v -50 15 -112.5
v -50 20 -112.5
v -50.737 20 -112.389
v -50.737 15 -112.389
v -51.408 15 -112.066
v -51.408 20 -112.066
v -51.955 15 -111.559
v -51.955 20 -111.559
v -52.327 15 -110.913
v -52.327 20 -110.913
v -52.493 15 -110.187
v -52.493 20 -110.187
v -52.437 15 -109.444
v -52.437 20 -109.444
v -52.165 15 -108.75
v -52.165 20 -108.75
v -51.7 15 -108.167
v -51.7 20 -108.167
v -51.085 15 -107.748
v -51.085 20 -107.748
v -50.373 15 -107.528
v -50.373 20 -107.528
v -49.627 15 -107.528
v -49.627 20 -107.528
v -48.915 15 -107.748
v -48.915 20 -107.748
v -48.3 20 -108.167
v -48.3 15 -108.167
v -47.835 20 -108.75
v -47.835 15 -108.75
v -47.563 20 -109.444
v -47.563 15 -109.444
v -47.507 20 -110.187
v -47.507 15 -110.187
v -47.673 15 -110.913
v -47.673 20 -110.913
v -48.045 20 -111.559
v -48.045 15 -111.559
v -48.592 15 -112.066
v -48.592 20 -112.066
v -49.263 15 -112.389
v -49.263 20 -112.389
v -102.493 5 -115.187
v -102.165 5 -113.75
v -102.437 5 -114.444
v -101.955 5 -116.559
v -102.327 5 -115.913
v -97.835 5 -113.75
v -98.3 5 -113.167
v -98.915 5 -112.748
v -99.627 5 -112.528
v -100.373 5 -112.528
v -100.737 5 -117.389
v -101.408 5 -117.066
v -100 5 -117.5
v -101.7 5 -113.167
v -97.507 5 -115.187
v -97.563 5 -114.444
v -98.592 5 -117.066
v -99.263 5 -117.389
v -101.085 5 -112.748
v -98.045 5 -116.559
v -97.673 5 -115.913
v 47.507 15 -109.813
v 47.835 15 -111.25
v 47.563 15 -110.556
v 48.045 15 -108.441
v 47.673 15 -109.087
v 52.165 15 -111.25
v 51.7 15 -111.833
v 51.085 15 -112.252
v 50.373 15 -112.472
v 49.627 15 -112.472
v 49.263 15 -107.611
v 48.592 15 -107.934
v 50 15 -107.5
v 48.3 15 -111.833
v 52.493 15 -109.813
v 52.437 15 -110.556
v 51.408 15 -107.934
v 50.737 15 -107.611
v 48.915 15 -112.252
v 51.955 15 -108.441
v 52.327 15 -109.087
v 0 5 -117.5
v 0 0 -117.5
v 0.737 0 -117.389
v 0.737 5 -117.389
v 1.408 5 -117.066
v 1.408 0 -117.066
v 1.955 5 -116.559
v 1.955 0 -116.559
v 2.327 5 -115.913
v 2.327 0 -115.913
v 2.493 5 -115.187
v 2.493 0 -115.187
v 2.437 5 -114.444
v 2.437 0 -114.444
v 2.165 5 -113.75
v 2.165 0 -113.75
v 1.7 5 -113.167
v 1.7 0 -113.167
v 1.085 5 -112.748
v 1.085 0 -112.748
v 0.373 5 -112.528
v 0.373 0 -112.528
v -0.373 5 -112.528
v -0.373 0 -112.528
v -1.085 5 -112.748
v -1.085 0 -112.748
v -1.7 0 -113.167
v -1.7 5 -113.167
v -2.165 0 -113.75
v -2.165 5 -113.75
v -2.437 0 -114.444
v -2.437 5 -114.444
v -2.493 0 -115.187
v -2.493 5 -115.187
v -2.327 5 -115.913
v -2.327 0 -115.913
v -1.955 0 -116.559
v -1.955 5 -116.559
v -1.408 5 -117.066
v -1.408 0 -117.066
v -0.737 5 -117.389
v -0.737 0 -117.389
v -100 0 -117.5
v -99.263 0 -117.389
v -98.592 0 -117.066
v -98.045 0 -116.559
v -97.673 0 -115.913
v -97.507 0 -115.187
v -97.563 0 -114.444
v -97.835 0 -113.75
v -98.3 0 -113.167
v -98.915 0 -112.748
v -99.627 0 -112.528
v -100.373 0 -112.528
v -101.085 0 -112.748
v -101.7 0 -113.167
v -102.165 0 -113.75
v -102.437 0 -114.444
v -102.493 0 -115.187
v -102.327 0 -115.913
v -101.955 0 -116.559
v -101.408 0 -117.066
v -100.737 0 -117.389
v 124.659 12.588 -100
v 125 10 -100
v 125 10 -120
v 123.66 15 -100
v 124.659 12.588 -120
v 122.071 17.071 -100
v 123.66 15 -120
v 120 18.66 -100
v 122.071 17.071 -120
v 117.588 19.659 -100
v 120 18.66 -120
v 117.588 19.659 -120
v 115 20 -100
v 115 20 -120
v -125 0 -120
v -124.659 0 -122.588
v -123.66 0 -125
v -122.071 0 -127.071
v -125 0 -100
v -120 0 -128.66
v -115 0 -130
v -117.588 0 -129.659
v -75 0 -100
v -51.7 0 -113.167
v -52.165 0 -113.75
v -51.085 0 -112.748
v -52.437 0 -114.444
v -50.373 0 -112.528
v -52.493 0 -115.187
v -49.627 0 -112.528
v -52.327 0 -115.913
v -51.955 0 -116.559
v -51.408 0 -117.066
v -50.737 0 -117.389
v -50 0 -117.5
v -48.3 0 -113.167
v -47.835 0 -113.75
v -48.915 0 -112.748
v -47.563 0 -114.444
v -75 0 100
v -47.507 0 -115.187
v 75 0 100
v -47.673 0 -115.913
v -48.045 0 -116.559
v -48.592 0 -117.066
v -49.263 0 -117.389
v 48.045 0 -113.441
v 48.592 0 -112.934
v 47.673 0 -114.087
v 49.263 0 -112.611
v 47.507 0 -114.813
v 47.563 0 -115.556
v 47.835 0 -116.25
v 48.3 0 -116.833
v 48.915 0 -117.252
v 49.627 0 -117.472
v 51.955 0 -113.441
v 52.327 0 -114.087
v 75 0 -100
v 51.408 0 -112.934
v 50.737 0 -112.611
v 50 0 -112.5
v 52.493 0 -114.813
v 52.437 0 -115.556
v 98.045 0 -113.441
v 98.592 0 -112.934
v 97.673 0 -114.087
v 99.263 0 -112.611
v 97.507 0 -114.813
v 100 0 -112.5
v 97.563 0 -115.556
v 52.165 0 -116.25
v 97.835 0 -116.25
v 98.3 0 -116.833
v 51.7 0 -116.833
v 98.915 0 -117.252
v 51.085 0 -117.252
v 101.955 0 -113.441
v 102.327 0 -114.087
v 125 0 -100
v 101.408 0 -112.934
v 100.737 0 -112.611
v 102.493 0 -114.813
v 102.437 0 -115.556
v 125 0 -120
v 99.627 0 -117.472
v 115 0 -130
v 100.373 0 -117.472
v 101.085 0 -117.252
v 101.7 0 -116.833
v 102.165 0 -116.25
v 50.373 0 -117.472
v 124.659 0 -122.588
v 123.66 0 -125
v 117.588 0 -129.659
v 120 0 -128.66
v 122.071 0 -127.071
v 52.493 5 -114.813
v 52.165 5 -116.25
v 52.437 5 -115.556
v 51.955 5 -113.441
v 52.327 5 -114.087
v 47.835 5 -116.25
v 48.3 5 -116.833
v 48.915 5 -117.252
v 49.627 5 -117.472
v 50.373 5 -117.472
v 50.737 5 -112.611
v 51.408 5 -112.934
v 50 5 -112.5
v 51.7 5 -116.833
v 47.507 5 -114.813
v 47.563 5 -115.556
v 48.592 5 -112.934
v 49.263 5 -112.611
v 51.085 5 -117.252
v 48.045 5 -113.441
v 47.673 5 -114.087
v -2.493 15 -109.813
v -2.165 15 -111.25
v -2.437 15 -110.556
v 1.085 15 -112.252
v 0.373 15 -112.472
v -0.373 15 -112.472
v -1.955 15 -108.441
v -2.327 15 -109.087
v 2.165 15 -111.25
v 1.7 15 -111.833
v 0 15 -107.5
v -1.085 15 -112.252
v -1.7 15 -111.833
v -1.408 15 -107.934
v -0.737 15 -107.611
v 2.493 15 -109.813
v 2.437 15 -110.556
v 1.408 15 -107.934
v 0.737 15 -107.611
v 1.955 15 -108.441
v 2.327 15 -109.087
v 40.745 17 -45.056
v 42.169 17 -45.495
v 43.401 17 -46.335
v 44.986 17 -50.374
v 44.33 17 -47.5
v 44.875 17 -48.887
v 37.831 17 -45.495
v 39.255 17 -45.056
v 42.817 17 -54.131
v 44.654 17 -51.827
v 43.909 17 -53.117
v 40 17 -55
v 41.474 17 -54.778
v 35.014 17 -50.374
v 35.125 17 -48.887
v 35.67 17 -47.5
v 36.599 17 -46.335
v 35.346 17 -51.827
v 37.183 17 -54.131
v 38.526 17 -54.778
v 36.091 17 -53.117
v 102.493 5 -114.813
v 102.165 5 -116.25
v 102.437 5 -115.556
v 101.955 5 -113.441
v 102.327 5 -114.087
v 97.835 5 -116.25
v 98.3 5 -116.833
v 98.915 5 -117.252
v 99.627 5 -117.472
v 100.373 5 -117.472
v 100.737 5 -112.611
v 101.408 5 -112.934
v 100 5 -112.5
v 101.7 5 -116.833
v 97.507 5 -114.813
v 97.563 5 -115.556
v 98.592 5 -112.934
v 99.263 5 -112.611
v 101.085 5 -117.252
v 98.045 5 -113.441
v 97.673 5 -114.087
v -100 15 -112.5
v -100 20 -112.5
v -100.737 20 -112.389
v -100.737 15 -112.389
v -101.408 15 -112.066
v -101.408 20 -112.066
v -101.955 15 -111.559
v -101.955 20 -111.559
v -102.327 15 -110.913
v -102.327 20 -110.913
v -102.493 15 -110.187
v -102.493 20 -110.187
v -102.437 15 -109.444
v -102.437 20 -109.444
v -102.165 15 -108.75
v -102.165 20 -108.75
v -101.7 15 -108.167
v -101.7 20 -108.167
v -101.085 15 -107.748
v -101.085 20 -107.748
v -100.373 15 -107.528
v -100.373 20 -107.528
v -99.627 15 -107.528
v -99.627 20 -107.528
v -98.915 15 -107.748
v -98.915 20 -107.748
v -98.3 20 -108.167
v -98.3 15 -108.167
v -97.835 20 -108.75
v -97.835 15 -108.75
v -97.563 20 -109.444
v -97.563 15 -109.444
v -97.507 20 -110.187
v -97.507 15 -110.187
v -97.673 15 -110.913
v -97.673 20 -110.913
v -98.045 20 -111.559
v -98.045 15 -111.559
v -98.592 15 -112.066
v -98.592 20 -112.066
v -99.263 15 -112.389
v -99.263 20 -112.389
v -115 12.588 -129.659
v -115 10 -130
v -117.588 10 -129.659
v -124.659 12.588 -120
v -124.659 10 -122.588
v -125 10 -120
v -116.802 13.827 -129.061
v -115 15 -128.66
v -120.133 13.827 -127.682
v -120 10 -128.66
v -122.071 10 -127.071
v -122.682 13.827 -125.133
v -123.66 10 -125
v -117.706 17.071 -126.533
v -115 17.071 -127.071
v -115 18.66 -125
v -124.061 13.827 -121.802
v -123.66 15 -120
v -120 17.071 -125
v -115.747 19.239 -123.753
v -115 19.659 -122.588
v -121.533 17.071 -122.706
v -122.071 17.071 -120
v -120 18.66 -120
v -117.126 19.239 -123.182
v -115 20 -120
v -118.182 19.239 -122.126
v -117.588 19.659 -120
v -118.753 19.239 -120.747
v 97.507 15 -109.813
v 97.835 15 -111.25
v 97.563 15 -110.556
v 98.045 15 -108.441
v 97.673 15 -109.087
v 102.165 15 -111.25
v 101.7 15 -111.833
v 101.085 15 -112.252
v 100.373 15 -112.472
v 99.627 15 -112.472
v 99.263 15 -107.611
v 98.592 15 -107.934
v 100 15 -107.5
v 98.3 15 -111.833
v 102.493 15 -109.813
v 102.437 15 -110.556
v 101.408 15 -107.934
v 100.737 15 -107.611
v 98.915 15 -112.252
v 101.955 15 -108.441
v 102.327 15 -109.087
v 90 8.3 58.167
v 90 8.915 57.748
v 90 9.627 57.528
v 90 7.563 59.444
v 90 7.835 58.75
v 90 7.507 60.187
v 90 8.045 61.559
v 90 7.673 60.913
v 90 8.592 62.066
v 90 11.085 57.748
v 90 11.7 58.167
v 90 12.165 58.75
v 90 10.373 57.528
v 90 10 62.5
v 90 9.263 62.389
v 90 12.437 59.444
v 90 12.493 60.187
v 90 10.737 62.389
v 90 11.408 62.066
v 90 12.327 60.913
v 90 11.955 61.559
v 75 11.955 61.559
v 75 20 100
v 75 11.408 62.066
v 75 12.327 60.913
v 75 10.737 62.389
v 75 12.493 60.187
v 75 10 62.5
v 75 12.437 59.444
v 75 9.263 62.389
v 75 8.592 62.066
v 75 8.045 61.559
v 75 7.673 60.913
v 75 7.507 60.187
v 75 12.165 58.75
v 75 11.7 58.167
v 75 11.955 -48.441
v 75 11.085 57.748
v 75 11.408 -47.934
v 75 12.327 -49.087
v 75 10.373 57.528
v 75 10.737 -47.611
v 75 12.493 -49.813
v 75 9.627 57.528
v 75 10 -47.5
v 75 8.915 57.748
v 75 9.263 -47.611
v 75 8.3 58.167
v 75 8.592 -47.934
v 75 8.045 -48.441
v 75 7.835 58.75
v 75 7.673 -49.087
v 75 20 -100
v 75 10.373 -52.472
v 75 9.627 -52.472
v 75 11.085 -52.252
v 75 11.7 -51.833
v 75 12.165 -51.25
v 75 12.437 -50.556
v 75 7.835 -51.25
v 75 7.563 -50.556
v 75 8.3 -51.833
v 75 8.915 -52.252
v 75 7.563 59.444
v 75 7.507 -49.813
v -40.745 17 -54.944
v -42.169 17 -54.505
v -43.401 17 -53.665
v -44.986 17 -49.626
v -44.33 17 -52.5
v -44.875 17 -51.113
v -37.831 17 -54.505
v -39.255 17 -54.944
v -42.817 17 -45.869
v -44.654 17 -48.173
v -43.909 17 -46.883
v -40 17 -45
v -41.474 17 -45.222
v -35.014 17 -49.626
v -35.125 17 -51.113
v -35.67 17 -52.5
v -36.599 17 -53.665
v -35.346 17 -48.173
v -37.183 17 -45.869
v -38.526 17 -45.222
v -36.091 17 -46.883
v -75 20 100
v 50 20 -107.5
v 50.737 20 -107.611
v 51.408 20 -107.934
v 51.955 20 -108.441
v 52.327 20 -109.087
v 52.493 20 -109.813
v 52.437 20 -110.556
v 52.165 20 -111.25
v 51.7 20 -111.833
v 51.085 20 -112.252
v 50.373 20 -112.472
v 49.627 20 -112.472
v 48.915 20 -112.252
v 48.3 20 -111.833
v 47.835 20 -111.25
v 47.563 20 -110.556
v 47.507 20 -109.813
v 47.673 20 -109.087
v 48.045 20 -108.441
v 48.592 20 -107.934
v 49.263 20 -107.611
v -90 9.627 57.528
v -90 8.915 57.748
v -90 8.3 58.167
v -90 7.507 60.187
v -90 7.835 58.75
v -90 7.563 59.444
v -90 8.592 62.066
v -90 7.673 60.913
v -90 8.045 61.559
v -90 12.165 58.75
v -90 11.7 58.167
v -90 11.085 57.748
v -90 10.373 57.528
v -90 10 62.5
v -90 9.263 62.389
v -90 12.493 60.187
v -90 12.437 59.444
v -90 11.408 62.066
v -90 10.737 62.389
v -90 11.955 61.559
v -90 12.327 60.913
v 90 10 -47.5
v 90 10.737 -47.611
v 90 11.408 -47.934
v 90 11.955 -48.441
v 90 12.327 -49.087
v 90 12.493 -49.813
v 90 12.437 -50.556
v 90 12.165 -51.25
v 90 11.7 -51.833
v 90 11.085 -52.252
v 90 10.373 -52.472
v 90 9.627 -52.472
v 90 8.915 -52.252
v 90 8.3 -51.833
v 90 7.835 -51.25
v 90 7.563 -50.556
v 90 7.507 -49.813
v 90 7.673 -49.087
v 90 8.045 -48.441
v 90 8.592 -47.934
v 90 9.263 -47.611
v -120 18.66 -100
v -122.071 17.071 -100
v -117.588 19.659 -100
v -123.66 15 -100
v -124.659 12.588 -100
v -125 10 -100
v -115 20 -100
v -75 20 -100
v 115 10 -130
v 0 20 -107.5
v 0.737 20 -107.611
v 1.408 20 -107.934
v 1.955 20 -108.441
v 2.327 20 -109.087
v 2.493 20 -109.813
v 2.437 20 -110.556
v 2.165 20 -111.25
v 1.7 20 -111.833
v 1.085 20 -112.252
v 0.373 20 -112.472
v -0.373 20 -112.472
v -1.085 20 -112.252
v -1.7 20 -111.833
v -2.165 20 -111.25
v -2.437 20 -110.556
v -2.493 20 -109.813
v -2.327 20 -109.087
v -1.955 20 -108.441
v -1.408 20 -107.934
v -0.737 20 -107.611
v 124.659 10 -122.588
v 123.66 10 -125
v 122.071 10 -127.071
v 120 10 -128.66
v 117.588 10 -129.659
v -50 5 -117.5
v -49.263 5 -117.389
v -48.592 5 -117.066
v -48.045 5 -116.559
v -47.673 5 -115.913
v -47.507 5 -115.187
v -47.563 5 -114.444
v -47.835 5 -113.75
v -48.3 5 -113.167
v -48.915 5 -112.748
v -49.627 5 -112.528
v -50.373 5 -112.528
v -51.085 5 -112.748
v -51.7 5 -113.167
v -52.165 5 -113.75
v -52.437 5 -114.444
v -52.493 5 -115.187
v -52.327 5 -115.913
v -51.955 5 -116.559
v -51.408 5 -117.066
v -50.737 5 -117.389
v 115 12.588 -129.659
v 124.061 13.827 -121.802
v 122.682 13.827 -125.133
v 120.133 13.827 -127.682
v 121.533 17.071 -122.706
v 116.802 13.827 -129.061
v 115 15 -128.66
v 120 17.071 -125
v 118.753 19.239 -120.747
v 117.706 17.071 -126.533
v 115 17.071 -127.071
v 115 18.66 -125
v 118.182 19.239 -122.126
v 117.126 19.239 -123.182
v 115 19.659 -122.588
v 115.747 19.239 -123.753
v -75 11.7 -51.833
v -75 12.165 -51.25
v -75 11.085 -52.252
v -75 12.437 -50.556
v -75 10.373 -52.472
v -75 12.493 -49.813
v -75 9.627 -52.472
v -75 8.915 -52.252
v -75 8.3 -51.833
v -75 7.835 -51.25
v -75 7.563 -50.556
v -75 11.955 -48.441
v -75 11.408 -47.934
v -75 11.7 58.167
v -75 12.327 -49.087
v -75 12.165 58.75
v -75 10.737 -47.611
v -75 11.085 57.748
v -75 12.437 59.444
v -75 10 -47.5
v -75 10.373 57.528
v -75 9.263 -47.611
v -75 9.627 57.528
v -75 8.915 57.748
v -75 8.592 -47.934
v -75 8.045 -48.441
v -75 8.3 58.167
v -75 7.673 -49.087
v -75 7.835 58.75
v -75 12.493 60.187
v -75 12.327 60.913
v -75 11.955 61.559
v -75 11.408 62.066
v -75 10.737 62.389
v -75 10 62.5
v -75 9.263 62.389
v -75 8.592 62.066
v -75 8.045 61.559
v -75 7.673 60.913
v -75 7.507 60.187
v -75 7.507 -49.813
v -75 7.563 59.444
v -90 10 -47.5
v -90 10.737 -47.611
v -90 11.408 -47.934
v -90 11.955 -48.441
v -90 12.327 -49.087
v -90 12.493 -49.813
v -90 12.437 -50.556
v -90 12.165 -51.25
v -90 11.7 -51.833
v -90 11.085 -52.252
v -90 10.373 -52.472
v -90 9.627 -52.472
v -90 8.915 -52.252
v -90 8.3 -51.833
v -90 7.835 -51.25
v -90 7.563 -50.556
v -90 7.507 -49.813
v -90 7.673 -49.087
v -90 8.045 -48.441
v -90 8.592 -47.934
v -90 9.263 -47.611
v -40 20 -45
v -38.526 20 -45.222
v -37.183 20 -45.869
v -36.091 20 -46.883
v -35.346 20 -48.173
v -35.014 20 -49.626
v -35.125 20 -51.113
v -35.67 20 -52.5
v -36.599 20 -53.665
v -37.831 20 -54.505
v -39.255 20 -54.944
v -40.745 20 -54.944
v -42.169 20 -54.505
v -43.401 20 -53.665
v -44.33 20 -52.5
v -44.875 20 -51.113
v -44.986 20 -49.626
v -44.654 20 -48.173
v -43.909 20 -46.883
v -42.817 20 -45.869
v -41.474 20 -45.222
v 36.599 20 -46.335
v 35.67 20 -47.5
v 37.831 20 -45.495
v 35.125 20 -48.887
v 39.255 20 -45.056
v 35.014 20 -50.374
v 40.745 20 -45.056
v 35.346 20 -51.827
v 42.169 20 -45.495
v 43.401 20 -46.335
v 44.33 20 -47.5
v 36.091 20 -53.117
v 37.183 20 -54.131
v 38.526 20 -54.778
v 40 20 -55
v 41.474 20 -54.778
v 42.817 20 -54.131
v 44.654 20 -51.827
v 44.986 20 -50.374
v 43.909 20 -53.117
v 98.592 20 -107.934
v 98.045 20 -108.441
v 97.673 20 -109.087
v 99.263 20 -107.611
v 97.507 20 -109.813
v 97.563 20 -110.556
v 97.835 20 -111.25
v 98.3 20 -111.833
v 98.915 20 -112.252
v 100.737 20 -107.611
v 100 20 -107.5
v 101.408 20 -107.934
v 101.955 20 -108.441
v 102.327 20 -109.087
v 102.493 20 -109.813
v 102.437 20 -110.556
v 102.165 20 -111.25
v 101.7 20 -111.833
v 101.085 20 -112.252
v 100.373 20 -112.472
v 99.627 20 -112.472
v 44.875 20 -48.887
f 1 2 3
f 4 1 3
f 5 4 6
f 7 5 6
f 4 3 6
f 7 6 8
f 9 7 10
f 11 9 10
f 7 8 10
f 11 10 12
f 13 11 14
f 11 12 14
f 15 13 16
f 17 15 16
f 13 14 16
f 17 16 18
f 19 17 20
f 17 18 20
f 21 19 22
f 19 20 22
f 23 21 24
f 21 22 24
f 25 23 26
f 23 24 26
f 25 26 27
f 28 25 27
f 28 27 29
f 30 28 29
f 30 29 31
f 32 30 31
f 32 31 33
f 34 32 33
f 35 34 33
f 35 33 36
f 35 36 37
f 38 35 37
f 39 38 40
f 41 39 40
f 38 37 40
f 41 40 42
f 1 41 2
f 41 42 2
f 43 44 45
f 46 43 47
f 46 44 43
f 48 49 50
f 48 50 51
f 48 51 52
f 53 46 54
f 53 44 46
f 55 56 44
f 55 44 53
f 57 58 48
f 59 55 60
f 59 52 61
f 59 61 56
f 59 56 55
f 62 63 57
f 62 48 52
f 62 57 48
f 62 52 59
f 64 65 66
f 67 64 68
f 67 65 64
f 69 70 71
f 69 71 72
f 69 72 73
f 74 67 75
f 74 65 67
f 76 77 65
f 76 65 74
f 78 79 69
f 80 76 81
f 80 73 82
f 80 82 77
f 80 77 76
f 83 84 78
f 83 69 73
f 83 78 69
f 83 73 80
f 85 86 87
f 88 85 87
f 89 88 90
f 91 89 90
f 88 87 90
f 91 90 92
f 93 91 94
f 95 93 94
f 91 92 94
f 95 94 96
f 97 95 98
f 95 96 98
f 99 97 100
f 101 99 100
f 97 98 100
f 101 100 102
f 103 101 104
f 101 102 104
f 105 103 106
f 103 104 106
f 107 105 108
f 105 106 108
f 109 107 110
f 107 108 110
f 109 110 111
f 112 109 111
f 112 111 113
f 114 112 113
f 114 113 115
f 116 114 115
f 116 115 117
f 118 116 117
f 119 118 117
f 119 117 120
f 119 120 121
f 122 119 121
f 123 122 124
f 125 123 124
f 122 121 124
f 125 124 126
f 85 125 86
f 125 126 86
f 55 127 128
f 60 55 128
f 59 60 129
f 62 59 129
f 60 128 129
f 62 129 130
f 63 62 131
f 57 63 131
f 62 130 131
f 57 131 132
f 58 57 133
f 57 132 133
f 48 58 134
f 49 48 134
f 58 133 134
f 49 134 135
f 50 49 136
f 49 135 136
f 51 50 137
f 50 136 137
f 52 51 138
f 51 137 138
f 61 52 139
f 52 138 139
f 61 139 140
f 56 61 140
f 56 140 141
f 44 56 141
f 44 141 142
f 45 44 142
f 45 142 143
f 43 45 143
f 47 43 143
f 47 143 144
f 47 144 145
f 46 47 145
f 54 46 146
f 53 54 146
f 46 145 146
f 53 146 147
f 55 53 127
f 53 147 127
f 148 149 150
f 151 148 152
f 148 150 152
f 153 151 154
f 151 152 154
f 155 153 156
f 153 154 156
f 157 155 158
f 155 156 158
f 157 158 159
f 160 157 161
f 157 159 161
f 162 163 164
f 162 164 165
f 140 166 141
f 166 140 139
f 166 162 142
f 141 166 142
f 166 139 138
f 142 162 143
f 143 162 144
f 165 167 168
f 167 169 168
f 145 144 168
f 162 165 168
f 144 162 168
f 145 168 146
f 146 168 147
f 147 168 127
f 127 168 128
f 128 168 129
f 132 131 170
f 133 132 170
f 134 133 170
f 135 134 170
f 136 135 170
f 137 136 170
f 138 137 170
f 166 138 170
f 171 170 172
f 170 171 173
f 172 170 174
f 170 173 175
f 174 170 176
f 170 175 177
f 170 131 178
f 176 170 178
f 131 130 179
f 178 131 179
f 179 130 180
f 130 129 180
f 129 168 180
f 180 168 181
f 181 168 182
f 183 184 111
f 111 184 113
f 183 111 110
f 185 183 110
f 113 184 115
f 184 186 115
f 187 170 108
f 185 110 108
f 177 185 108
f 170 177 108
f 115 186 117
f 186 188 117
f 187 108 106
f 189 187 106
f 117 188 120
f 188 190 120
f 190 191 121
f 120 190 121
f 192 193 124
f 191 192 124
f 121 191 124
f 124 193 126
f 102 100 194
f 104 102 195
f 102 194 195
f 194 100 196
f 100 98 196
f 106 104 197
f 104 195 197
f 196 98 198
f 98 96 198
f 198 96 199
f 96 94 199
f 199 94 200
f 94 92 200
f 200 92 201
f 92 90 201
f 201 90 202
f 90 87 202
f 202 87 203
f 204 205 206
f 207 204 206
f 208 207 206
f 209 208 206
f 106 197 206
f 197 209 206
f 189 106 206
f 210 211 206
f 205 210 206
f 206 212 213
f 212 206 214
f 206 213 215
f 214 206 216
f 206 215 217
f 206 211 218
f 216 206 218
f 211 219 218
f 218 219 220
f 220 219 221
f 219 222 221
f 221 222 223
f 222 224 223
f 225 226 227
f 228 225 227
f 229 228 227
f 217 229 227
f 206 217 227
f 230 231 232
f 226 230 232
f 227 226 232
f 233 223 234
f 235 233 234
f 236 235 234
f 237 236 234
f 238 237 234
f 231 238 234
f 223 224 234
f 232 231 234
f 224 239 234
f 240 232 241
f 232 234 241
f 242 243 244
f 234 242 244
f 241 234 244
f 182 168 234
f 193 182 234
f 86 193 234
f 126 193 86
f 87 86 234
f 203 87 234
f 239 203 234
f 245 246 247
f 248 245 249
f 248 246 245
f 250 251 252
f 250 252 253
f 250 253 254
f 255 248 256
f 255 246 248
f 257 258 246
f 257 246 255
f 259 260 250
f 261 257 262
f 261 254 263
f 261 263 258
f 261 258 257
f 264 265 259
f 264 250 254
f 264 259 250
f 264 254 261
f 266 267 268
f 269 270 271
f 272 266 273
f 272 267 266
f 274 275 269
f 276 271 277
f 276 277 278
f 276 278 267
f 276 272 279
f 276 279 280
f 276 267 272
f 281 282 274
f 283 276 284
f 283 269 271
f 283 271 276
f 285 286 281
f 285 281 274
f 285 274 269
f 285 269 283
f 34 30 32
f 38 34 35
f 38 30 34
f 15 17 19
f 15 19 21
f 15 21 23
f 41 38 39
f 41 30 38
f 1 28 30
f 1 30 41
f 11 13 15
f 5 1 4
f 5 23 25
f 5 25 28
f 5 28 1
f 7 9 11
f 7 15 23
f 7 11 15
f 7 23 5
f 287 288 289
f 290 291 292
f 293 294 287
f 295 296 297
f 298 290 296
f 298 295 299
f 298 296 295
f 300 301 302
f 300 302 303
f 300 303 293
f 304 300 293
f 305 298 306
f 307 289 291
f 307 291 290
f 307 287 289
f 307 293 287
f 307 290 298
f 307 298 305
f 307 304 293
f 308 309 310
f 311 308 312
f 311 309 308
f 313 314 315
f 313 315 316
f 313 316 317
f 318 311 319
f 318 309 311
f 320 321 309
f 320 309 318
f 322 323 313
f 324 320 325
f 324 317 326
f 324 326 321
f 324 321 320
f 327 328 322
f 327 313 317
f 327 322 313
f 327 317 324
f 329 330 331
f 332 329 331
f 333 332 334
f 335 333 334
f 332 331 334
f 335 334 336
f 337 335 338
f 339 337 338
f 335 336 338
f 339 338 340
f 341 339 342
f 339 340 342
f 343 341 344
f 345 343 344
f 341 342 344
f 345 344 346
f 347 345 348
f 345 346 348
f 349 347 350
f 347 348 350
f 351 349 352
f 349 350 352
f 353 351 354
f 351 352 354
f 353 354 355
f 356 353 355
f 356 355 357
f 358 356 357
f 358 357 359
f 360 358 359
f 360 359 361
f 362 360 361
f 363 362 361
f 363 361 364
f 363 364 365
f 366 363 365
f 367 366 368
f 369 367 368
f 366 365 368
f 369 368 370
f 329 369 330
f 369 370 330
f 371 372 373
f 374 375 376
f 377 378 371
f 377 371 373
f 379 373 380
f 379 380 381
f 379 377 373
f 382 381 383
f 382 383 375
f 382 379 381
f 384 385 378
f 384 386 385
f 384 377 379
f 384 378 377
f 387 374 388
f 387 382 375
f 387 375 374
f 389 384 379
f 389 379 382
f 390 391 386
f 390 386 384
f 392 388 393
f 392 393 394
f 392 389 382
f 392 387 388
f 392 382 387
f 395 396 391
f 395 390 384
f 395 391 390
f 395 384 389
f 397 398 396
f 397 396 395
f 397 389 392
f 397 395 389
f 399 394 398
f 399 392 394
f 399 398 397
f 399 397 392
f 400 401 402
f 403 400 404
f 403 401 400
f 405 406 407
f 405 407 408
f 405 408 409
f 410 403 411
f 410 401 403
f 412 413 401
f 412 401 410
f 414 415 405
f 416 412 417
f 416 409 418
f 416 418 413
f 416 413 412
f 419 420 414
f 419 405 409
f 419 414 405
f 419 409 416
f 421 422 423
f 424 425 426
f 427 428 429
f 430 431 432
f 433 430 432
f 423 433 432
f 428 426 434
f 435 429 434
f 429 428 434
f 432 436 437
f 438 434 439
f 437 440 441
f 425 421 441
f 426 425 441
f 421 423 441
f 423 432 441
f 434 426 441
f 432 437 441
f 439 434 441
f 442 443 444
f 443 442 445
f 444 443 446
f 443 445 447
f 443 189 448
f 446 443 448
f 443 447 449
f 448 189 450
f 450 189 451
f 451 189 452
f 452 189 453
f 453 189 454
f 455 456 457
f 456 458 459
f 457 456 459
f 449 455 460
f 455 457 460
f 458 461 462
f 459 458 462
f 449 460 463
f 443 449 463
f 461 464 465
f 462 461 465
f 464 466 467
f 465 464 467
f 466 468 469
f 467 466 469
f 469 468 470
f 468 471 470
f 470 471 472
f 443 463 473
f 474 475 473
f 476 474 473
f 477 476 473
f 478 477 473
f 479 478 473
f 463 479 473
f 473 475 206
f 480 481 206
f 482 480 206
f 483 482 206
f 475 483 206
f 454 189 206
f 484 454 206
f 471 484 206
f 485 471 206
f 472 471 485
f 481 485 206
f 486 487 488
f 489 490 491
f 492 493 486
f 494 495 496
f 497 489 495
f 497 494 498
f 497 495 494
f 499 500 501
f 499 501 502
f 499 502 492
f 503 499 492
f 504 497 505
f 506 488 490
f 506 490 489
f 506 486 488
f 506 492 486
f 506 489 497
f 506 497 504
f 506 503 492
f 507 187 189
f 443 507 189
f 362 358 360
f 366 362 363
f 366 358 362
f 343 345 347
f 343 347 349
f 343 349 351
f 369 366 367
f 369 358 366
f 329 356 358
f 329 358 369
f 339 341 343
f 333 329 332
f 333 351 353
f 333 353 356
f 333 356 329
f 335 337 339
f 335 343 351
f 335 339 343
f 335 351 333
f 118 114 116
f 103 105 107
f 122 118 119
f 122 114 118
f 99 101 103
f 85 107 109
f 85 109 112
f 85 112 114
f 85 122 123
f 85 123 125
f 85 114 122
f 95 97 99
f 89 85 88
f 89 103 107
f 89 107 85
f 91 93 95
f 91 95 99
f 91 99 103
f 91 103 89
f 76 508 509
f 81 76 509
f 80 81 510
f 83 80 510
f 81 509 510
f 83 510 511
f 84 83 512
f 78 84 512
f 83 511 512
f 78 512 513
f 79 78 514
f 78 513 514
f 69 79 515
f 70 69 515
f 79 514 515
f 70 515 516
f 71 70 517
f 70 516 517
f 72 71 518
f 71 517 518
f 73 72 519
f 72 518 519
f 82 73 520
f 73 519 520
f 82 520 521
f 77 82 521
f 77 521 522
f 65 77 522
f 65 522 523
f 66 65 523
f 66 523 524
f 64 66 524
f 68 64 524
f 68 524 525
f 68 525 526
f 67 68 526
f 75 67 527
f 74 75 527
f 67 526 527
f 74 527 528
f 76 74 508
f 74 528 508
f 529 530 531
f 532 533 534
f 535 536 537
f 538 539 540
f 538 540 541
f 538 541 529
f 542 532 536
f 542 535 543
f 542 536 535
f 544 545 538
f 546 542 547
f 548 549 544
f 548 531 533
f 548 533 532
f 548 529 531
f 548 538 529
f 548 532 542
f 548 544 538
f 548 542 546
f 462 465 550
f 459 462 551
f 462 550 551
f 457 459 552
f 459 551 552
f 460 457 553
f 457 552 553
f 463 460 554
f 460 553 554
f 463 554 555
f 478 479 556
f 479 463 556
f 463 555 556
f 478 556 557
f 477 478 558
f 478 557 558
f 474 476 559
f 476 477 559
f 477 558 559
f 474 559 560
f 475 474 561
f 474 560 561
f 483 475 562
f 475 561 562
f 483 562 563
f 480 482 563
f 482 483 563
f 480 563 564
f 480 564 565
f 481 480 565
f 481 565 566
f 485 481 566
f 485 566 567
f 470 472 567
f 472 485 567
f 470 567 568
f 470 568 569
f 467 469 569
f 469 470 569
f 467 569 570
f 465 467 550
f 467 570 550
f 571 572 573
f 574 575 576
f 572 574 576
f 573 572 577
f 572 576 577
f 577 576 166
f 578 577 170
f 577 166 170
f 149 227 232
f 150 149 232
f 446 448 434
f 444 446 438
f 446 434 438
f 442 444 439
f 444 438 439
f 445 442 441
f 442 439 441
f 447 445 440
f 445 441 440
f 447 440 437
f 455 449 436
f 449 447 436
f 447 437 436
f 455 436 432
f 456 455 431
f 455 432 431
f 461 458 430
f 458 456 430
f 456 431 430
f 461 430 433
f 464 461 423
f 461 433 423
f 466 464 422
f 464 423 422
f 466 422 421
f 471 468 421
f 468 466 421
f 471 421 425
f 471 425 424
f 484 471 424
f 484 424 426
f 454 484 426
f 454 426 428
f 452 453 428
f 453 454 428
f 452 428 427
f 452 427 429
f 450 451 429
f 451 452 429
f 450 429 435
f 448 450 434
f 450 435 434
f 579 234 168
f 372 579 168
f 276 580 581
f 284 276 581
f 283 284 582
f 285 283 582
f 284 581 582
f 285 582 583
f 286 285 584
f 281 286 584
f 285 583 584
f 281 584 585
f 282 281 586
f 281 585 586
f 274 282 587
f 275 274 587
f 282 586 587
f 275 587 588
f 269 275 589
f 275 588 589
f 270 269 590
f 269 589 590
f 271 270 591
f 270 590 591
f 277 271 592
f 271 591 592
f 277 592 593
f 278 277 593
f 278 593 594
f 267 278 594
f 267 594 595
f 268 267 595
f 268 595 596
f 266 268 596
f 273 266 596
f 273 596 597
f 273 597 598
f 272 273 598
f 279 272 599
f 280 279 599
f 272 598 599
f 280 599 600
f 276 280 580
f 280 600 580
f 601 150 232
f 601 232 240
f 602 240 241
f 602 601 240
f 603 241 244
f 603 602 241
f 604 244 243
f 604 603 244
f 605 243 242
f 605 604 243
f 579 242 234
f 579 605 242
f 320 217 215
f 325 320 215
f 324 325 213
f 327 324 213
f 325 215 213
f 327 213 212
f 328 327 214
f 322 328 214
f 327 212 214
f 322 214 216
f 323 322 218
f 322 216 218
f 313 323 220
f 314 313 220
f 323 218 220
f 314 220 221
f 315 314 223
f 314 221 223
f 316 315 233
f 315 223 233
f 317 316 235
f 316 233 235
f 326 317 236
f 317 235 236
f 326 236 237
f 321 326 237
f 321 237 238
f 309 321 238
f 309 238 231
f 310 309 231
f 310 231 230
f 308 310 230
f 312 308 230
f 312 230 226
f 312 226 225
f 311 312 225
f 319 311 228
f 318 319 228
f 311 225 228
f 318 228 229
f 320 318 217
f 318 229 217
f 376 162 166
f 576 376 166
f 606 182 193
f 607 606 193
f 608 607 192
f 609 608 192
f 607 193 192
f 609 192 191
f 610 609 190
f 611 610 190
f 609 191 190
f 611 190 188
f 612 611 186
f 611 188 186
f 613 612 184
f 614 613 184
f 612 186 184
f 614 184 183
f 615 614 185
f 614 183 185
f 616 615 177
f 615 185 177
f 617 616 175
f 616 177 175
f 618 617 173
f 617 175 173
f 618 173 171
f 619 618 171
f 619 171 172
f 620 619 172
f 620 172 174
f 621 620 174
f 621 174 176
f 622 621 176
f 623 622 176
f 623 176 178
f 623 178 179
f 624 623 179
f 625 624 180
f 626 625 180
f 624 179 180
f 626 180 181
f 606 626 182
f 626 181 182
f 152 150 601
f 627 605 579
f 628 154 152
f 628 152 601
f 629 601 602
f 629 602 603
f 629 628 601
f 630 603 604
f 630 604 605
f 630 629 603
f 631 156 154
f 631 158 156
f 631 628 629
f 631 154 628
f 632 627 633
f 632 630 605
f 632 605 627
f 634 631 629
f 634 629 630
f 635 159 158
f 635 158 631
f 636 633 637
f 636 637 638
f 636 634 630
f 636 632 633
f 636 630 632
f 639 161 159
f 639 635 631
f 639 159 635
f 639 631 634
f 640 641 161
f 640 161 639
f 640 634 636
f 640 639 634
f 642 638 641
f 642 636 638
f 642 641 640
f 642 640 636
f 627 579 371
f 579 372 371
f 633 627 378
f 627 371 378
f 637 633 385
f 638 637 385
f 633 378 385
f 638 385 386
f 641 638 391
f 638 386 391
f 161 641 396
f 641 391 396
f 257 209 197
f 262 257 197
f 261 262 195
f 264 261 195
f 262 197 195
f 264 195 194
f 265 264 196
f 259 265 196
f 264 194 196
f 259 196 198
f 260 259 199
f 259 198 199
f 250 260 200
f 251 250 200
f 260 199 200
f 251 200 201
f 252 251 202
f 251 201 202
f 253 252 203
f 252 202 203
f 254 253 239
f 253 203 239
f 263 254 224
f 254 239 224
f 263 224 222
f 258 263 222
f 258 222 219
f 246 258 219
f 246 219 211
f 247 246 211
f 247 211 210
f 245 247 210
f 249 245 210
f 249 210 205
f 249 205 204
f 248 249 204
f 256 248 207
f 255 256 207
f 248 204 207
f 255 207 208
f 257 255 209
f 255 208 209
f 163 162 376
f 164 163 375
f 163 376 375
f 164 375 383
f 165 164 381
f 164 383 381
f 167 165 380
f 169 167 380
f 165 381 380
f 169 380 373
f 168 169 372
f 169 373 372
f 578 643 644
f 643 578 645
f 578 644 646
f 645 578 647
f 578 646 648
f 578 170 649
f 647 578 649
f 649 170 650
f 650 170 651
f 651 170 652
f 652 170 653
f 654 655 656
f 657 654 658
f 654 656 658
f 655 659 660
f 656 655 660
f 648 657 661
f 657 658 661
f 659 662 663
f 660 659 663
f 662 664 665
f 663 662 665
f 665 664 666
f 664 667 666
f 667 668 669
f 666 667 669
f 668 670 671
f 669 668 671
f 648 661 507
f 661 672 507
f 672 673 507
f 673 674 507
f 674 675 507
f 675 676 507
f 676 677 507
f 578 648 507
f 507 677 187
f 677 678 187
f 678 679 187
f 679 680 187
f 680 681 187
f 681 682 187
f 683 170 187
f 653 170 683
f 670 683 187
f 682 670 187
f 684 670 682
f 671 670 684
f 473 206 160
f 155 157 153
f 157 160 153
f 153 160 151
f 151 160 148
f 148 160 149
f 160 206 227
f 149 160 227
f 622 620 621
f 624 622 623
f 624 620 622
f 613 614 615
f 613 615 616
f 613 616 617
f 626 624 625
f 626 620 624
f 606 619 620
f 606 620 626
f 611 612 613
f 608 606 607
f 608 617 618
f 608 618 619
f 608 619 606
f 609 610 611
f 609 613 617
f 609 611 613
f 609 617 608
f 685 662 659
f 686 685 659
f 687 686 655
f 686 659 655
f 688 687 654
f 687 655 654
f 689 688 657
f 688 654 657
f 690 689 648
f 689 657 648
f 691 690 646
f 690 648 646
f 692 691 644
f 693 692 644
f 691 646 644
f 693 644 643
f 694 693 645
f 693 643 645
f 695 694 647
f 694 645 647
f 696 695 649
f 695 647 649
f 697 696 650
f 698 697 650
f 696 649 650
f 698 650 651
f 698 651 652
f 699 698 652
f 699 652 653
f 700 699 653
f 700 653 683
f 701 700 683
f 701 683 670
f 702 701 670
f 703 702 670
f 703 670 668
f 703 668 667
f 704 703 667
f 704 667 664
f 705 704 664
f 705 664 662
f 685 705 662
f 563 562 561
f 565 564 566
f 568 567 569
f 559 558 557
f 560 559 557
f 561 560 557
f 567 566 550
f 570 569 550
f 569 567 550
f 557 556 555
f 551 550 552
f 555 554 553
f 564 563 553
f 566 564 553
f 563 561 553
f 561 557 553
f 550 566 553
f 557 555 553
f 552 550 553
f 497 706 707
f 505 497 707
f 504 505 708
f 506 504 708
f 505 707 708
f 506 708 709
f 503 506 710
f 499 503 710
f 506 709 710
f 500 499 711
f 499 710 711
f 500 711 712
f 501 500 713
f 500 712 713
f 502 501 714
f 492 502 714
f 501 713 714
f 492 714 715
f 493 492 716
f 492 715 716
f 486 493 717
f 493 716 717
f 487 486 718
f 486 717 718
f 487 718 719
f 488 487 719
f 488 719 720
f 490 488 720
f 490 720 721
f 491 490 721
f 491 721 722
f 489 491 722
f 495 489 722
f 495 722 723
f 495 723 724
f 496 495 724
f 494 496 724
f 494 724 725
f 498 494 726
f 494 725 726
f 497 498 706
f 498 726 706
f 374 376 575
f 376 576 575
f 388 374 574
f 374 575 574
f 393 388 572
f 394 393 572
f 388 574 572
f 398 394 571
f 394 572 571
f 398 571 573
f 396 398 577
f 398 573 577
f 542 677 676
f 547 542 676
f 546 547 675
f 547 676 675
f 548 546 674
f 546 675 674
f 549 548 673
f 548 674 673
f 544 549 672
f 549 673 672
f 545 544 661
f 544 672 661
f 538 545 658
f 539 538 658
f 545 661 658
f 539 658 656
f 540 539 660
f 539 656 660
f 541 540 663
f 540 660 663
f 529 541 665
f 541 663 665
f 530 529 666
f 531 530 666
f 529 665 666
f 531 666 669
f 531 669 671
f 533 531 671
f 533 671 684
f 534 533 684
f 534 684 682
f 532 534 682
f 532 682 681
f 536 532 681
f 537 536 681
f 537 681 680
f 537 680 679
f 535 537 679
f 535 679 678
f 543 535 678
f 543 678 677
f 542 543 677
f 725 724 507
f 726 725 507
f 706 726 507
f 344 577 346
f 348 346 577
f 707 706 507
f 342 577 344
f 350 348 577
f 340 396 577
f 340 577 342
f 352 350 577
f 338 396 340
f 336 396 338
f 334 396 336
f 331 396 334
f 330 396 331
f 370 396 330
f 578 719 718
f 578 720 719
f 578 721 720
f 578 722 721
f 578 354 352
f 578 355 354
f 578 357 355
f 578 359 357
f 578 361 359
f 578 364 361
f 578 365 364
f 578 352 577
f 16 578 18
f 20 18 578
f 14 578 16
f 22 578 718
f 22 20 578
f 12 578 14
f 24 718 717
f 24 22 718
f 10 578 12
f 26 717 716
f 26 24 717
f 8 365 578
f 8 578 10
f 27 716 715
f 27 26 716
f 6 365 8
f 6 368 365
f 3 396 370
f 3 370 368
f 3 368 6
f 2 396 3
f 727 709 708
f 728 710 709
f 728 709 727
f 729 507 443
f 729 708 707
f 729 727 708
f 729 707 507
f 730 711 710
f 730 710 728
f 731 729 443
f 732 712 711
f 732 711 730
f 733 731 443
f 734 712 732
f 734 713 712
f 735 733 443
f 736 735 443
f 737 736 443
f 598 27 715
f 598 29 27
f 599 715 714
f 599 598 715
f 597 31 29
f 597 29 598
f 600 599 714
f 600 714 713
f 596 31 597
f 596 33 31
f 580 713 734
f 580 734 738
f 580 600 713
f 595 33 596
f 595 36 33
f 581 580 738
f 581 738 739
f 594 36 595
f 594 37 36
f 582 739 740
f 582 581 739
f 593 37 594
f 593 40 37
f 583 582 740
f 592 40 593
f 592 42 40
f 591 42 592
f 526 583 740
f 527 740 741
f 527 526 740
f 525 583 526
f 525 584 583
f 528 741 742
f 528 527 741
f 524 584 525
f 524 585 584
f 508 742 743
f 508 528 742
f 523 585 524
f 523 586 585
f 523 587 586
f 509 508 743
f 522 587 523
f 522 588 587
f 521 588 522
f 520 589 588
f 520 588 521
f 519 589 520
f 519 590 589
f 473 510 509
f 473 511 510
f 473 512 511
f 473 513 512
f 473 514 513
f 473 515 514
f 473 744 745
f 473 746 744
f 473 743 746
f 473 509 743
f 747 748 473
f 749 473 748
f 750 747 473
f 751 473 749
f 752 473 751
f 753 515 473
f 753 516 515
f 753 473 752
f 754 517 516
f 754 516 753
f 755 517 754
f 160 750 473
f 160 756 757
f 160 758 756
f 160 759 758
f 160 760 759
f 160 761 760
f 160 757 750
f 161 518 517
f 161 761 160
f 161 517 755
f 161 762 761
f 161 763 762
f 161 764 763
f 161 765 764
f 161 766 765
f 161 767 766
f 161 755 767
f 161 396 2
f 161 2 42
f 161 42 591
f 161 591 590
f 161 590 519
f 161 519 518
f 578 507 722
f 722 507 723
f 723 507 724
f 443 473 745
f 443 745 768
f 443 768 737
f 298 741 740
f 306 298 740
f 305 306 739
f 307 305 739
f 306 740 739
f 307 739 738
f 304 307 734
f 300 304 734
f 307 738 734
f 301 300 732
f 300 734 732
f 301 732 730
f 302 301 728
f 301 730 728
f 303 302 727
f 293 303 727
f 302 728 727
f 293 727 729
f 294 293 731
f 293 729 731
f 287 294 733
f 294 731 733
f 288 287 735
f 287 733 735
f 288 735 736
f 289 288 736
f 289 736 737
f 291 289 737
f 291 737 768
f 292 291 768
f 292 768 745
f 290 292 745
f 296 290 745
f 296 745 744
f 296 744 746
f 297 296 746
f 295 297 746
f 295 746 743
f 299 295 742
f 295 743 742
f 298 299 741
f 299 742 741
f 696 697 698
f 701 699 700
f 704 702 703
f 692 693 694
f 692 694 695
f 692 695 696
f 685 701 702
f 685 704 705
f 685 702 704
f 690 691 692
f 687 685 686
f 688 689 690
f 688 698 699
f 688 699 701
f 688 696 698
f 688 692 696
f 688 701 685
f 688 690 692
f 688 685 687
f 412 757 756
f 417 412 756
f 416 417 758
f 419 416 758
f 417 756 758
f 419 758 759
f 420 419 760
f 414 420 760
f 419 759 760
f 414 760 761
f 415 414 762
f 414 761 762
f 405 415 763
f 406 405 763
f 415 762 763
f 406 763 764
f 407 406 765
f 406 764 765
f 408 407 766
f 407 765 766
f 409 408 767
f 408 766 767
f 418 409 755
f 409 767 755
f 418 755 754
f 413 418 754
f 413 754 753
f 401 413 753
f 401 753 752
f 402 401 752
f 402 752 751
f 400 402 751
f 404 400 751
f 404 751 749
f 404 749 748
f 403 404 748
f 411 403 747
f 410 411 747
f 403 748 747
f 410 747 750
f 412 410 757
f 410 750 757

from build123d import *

# Parameters (mm, degrees)
BOSS_EXTRUDE1_DEPTH      = 20
SKETCH4_R                = 2.5
CUT_EXTRUDE2_DEPTH       = 5
FILLET1_R                = 10
FILLET2_R                = 10
SKETCH6_R                = 2.5
CUT_EXTRUDE3_DEPTH       = 5
SKETCH8_R                = 5
CUT_EXTRUDE5_DEPTH       = 3
BOSS_EXTRUDE2_DEPTH      = 15
BOSS_EXTRUDE2_DEPTH_BACK = 165
SKETCH2_R                = 2.5


with BuildPart() as part:
    # Sketch1 → Boss-Extrude1 (new body)
    with BuildSketch(Plane(origin=(0, 0, 0), x_dir=(1, 0, 0), z_dir=(0, 1, 0))):
        Polygon((-75, -100), (75, -100), (75, 100), (125, 100), (125, 130), (-125, 130), (-125, 100), (-75, 100), align=None)
    extrude(amount=BOSS_EXTRUDE1_DEPTH)

    # Sketch4 → Cut-Extrude2 (cut)
    with BuildSketch(Plane.XZ):
        with Locations(Location((-100, -115, 0), (0, 0, 270))):
            Circle(SKETCH4_R)
        with Locations(Location((-50, -115, 0), (0, 0, 270))):
            Circle(SKETCH4_R)
        with Locations(Location((0, -115, 0), (0, 0, 270))):
            Circle(SKETCH4_R)
        with Locations(Location((50, -115, 0), (0, 0, 90))):
            Circle(SKETCH4_R)
        with Locations(Location((100, -115, 0), (0, 0, 90))):
            Circle(SKETCH4_R)
    extrude(amount=-CUT_EXTRUDE2_DEPTH, mode=Mode.SUBTRACT)

    # Fillet1
    fillet1_edges = [part.edges().sort_by_distance(p)[0] for p in [
        (-125, 10, -130),
        (125, 10, -130),
    ]]
    fillet(fillet1_edges, radius=FILLET1_R)

    # Fillet2
    fillet2_edges = [part.edges().sort_by_distance(p)[0] for p in [
        (125, 20, -110),
        (0, 20, -130),
        (-125, 20, -110),
        (-122.071067812, 20, -127.071067812),
        (122.071067812, 20, -127.071067812),
    ]]
    fillet(fillet2_edges, radius=FILLET2_R)

    # Sketch6 → Cut-Extrude3 (cut)
    with BuildSketch(Plane(origin=(0, 20, 0), x_dir=(1, 0, 0), z_dir=(0, 1, 0))):
        with Locations(Location((0, 110, 0), (0, 0, 270))):
            Circle(SKETCH6_R)
        with Locations(Location((50, 110, 0), (0, 0, 270))):
            Circle(SKETCH6_R)
        with Locations(Location((100, 110, 0), (0, 0, 270))):
            Circle(SKETCH6_R)
        with Locations(Location((-50, 110, 0), (0, 0, 90))):
            Circle(SKETCH6_R)
        with Locations(Location((-100, 110, 0), (0, 0, 90))):
            Circle(SKETCH6_R)
    extrude(amount=-CUT_EXTRUDE3_DEPTH, mode=Mode.SUBTRACT)

    # Sketch8 → Cut-Extrude5 (cut)
    with BuildSketch(Plane(origin=(0, 20, 0), x_dir=(1, 0, 0), z_dir=(0, 1, 0))):
        with Locations(Location((-40, 50, 0), (0, 0, 270))):
            Circle(SKETCH8_R)
        with Locations(Location((40, 50, 0), (0, 0, 90))):
            Circle(SKETCH8_R)
    extrude(amount=-CUT_EXTRUDE5_DEPTH, mode=Mode.SUBTRACT)

    # Sketch2 → Boss-Extrude2 (add, two sides: drawn at the far end of the back side and taken through both)
    with BuildSketch(Plane.ZY.offset(75).offset(-BOSS_EXTRUDE2_DEPTH_BACK)):
        with Locations((60, 10)):
            Circle(SKETCH2_R)
        with Locations((-50, 10)):
            Circle(SKETCH2_R)
    extrude(amount=BOSS_EXTRUDE2_DEPTH + BOSS_EXTRUDE2_DEPTH_BACK)


solid = part.part
